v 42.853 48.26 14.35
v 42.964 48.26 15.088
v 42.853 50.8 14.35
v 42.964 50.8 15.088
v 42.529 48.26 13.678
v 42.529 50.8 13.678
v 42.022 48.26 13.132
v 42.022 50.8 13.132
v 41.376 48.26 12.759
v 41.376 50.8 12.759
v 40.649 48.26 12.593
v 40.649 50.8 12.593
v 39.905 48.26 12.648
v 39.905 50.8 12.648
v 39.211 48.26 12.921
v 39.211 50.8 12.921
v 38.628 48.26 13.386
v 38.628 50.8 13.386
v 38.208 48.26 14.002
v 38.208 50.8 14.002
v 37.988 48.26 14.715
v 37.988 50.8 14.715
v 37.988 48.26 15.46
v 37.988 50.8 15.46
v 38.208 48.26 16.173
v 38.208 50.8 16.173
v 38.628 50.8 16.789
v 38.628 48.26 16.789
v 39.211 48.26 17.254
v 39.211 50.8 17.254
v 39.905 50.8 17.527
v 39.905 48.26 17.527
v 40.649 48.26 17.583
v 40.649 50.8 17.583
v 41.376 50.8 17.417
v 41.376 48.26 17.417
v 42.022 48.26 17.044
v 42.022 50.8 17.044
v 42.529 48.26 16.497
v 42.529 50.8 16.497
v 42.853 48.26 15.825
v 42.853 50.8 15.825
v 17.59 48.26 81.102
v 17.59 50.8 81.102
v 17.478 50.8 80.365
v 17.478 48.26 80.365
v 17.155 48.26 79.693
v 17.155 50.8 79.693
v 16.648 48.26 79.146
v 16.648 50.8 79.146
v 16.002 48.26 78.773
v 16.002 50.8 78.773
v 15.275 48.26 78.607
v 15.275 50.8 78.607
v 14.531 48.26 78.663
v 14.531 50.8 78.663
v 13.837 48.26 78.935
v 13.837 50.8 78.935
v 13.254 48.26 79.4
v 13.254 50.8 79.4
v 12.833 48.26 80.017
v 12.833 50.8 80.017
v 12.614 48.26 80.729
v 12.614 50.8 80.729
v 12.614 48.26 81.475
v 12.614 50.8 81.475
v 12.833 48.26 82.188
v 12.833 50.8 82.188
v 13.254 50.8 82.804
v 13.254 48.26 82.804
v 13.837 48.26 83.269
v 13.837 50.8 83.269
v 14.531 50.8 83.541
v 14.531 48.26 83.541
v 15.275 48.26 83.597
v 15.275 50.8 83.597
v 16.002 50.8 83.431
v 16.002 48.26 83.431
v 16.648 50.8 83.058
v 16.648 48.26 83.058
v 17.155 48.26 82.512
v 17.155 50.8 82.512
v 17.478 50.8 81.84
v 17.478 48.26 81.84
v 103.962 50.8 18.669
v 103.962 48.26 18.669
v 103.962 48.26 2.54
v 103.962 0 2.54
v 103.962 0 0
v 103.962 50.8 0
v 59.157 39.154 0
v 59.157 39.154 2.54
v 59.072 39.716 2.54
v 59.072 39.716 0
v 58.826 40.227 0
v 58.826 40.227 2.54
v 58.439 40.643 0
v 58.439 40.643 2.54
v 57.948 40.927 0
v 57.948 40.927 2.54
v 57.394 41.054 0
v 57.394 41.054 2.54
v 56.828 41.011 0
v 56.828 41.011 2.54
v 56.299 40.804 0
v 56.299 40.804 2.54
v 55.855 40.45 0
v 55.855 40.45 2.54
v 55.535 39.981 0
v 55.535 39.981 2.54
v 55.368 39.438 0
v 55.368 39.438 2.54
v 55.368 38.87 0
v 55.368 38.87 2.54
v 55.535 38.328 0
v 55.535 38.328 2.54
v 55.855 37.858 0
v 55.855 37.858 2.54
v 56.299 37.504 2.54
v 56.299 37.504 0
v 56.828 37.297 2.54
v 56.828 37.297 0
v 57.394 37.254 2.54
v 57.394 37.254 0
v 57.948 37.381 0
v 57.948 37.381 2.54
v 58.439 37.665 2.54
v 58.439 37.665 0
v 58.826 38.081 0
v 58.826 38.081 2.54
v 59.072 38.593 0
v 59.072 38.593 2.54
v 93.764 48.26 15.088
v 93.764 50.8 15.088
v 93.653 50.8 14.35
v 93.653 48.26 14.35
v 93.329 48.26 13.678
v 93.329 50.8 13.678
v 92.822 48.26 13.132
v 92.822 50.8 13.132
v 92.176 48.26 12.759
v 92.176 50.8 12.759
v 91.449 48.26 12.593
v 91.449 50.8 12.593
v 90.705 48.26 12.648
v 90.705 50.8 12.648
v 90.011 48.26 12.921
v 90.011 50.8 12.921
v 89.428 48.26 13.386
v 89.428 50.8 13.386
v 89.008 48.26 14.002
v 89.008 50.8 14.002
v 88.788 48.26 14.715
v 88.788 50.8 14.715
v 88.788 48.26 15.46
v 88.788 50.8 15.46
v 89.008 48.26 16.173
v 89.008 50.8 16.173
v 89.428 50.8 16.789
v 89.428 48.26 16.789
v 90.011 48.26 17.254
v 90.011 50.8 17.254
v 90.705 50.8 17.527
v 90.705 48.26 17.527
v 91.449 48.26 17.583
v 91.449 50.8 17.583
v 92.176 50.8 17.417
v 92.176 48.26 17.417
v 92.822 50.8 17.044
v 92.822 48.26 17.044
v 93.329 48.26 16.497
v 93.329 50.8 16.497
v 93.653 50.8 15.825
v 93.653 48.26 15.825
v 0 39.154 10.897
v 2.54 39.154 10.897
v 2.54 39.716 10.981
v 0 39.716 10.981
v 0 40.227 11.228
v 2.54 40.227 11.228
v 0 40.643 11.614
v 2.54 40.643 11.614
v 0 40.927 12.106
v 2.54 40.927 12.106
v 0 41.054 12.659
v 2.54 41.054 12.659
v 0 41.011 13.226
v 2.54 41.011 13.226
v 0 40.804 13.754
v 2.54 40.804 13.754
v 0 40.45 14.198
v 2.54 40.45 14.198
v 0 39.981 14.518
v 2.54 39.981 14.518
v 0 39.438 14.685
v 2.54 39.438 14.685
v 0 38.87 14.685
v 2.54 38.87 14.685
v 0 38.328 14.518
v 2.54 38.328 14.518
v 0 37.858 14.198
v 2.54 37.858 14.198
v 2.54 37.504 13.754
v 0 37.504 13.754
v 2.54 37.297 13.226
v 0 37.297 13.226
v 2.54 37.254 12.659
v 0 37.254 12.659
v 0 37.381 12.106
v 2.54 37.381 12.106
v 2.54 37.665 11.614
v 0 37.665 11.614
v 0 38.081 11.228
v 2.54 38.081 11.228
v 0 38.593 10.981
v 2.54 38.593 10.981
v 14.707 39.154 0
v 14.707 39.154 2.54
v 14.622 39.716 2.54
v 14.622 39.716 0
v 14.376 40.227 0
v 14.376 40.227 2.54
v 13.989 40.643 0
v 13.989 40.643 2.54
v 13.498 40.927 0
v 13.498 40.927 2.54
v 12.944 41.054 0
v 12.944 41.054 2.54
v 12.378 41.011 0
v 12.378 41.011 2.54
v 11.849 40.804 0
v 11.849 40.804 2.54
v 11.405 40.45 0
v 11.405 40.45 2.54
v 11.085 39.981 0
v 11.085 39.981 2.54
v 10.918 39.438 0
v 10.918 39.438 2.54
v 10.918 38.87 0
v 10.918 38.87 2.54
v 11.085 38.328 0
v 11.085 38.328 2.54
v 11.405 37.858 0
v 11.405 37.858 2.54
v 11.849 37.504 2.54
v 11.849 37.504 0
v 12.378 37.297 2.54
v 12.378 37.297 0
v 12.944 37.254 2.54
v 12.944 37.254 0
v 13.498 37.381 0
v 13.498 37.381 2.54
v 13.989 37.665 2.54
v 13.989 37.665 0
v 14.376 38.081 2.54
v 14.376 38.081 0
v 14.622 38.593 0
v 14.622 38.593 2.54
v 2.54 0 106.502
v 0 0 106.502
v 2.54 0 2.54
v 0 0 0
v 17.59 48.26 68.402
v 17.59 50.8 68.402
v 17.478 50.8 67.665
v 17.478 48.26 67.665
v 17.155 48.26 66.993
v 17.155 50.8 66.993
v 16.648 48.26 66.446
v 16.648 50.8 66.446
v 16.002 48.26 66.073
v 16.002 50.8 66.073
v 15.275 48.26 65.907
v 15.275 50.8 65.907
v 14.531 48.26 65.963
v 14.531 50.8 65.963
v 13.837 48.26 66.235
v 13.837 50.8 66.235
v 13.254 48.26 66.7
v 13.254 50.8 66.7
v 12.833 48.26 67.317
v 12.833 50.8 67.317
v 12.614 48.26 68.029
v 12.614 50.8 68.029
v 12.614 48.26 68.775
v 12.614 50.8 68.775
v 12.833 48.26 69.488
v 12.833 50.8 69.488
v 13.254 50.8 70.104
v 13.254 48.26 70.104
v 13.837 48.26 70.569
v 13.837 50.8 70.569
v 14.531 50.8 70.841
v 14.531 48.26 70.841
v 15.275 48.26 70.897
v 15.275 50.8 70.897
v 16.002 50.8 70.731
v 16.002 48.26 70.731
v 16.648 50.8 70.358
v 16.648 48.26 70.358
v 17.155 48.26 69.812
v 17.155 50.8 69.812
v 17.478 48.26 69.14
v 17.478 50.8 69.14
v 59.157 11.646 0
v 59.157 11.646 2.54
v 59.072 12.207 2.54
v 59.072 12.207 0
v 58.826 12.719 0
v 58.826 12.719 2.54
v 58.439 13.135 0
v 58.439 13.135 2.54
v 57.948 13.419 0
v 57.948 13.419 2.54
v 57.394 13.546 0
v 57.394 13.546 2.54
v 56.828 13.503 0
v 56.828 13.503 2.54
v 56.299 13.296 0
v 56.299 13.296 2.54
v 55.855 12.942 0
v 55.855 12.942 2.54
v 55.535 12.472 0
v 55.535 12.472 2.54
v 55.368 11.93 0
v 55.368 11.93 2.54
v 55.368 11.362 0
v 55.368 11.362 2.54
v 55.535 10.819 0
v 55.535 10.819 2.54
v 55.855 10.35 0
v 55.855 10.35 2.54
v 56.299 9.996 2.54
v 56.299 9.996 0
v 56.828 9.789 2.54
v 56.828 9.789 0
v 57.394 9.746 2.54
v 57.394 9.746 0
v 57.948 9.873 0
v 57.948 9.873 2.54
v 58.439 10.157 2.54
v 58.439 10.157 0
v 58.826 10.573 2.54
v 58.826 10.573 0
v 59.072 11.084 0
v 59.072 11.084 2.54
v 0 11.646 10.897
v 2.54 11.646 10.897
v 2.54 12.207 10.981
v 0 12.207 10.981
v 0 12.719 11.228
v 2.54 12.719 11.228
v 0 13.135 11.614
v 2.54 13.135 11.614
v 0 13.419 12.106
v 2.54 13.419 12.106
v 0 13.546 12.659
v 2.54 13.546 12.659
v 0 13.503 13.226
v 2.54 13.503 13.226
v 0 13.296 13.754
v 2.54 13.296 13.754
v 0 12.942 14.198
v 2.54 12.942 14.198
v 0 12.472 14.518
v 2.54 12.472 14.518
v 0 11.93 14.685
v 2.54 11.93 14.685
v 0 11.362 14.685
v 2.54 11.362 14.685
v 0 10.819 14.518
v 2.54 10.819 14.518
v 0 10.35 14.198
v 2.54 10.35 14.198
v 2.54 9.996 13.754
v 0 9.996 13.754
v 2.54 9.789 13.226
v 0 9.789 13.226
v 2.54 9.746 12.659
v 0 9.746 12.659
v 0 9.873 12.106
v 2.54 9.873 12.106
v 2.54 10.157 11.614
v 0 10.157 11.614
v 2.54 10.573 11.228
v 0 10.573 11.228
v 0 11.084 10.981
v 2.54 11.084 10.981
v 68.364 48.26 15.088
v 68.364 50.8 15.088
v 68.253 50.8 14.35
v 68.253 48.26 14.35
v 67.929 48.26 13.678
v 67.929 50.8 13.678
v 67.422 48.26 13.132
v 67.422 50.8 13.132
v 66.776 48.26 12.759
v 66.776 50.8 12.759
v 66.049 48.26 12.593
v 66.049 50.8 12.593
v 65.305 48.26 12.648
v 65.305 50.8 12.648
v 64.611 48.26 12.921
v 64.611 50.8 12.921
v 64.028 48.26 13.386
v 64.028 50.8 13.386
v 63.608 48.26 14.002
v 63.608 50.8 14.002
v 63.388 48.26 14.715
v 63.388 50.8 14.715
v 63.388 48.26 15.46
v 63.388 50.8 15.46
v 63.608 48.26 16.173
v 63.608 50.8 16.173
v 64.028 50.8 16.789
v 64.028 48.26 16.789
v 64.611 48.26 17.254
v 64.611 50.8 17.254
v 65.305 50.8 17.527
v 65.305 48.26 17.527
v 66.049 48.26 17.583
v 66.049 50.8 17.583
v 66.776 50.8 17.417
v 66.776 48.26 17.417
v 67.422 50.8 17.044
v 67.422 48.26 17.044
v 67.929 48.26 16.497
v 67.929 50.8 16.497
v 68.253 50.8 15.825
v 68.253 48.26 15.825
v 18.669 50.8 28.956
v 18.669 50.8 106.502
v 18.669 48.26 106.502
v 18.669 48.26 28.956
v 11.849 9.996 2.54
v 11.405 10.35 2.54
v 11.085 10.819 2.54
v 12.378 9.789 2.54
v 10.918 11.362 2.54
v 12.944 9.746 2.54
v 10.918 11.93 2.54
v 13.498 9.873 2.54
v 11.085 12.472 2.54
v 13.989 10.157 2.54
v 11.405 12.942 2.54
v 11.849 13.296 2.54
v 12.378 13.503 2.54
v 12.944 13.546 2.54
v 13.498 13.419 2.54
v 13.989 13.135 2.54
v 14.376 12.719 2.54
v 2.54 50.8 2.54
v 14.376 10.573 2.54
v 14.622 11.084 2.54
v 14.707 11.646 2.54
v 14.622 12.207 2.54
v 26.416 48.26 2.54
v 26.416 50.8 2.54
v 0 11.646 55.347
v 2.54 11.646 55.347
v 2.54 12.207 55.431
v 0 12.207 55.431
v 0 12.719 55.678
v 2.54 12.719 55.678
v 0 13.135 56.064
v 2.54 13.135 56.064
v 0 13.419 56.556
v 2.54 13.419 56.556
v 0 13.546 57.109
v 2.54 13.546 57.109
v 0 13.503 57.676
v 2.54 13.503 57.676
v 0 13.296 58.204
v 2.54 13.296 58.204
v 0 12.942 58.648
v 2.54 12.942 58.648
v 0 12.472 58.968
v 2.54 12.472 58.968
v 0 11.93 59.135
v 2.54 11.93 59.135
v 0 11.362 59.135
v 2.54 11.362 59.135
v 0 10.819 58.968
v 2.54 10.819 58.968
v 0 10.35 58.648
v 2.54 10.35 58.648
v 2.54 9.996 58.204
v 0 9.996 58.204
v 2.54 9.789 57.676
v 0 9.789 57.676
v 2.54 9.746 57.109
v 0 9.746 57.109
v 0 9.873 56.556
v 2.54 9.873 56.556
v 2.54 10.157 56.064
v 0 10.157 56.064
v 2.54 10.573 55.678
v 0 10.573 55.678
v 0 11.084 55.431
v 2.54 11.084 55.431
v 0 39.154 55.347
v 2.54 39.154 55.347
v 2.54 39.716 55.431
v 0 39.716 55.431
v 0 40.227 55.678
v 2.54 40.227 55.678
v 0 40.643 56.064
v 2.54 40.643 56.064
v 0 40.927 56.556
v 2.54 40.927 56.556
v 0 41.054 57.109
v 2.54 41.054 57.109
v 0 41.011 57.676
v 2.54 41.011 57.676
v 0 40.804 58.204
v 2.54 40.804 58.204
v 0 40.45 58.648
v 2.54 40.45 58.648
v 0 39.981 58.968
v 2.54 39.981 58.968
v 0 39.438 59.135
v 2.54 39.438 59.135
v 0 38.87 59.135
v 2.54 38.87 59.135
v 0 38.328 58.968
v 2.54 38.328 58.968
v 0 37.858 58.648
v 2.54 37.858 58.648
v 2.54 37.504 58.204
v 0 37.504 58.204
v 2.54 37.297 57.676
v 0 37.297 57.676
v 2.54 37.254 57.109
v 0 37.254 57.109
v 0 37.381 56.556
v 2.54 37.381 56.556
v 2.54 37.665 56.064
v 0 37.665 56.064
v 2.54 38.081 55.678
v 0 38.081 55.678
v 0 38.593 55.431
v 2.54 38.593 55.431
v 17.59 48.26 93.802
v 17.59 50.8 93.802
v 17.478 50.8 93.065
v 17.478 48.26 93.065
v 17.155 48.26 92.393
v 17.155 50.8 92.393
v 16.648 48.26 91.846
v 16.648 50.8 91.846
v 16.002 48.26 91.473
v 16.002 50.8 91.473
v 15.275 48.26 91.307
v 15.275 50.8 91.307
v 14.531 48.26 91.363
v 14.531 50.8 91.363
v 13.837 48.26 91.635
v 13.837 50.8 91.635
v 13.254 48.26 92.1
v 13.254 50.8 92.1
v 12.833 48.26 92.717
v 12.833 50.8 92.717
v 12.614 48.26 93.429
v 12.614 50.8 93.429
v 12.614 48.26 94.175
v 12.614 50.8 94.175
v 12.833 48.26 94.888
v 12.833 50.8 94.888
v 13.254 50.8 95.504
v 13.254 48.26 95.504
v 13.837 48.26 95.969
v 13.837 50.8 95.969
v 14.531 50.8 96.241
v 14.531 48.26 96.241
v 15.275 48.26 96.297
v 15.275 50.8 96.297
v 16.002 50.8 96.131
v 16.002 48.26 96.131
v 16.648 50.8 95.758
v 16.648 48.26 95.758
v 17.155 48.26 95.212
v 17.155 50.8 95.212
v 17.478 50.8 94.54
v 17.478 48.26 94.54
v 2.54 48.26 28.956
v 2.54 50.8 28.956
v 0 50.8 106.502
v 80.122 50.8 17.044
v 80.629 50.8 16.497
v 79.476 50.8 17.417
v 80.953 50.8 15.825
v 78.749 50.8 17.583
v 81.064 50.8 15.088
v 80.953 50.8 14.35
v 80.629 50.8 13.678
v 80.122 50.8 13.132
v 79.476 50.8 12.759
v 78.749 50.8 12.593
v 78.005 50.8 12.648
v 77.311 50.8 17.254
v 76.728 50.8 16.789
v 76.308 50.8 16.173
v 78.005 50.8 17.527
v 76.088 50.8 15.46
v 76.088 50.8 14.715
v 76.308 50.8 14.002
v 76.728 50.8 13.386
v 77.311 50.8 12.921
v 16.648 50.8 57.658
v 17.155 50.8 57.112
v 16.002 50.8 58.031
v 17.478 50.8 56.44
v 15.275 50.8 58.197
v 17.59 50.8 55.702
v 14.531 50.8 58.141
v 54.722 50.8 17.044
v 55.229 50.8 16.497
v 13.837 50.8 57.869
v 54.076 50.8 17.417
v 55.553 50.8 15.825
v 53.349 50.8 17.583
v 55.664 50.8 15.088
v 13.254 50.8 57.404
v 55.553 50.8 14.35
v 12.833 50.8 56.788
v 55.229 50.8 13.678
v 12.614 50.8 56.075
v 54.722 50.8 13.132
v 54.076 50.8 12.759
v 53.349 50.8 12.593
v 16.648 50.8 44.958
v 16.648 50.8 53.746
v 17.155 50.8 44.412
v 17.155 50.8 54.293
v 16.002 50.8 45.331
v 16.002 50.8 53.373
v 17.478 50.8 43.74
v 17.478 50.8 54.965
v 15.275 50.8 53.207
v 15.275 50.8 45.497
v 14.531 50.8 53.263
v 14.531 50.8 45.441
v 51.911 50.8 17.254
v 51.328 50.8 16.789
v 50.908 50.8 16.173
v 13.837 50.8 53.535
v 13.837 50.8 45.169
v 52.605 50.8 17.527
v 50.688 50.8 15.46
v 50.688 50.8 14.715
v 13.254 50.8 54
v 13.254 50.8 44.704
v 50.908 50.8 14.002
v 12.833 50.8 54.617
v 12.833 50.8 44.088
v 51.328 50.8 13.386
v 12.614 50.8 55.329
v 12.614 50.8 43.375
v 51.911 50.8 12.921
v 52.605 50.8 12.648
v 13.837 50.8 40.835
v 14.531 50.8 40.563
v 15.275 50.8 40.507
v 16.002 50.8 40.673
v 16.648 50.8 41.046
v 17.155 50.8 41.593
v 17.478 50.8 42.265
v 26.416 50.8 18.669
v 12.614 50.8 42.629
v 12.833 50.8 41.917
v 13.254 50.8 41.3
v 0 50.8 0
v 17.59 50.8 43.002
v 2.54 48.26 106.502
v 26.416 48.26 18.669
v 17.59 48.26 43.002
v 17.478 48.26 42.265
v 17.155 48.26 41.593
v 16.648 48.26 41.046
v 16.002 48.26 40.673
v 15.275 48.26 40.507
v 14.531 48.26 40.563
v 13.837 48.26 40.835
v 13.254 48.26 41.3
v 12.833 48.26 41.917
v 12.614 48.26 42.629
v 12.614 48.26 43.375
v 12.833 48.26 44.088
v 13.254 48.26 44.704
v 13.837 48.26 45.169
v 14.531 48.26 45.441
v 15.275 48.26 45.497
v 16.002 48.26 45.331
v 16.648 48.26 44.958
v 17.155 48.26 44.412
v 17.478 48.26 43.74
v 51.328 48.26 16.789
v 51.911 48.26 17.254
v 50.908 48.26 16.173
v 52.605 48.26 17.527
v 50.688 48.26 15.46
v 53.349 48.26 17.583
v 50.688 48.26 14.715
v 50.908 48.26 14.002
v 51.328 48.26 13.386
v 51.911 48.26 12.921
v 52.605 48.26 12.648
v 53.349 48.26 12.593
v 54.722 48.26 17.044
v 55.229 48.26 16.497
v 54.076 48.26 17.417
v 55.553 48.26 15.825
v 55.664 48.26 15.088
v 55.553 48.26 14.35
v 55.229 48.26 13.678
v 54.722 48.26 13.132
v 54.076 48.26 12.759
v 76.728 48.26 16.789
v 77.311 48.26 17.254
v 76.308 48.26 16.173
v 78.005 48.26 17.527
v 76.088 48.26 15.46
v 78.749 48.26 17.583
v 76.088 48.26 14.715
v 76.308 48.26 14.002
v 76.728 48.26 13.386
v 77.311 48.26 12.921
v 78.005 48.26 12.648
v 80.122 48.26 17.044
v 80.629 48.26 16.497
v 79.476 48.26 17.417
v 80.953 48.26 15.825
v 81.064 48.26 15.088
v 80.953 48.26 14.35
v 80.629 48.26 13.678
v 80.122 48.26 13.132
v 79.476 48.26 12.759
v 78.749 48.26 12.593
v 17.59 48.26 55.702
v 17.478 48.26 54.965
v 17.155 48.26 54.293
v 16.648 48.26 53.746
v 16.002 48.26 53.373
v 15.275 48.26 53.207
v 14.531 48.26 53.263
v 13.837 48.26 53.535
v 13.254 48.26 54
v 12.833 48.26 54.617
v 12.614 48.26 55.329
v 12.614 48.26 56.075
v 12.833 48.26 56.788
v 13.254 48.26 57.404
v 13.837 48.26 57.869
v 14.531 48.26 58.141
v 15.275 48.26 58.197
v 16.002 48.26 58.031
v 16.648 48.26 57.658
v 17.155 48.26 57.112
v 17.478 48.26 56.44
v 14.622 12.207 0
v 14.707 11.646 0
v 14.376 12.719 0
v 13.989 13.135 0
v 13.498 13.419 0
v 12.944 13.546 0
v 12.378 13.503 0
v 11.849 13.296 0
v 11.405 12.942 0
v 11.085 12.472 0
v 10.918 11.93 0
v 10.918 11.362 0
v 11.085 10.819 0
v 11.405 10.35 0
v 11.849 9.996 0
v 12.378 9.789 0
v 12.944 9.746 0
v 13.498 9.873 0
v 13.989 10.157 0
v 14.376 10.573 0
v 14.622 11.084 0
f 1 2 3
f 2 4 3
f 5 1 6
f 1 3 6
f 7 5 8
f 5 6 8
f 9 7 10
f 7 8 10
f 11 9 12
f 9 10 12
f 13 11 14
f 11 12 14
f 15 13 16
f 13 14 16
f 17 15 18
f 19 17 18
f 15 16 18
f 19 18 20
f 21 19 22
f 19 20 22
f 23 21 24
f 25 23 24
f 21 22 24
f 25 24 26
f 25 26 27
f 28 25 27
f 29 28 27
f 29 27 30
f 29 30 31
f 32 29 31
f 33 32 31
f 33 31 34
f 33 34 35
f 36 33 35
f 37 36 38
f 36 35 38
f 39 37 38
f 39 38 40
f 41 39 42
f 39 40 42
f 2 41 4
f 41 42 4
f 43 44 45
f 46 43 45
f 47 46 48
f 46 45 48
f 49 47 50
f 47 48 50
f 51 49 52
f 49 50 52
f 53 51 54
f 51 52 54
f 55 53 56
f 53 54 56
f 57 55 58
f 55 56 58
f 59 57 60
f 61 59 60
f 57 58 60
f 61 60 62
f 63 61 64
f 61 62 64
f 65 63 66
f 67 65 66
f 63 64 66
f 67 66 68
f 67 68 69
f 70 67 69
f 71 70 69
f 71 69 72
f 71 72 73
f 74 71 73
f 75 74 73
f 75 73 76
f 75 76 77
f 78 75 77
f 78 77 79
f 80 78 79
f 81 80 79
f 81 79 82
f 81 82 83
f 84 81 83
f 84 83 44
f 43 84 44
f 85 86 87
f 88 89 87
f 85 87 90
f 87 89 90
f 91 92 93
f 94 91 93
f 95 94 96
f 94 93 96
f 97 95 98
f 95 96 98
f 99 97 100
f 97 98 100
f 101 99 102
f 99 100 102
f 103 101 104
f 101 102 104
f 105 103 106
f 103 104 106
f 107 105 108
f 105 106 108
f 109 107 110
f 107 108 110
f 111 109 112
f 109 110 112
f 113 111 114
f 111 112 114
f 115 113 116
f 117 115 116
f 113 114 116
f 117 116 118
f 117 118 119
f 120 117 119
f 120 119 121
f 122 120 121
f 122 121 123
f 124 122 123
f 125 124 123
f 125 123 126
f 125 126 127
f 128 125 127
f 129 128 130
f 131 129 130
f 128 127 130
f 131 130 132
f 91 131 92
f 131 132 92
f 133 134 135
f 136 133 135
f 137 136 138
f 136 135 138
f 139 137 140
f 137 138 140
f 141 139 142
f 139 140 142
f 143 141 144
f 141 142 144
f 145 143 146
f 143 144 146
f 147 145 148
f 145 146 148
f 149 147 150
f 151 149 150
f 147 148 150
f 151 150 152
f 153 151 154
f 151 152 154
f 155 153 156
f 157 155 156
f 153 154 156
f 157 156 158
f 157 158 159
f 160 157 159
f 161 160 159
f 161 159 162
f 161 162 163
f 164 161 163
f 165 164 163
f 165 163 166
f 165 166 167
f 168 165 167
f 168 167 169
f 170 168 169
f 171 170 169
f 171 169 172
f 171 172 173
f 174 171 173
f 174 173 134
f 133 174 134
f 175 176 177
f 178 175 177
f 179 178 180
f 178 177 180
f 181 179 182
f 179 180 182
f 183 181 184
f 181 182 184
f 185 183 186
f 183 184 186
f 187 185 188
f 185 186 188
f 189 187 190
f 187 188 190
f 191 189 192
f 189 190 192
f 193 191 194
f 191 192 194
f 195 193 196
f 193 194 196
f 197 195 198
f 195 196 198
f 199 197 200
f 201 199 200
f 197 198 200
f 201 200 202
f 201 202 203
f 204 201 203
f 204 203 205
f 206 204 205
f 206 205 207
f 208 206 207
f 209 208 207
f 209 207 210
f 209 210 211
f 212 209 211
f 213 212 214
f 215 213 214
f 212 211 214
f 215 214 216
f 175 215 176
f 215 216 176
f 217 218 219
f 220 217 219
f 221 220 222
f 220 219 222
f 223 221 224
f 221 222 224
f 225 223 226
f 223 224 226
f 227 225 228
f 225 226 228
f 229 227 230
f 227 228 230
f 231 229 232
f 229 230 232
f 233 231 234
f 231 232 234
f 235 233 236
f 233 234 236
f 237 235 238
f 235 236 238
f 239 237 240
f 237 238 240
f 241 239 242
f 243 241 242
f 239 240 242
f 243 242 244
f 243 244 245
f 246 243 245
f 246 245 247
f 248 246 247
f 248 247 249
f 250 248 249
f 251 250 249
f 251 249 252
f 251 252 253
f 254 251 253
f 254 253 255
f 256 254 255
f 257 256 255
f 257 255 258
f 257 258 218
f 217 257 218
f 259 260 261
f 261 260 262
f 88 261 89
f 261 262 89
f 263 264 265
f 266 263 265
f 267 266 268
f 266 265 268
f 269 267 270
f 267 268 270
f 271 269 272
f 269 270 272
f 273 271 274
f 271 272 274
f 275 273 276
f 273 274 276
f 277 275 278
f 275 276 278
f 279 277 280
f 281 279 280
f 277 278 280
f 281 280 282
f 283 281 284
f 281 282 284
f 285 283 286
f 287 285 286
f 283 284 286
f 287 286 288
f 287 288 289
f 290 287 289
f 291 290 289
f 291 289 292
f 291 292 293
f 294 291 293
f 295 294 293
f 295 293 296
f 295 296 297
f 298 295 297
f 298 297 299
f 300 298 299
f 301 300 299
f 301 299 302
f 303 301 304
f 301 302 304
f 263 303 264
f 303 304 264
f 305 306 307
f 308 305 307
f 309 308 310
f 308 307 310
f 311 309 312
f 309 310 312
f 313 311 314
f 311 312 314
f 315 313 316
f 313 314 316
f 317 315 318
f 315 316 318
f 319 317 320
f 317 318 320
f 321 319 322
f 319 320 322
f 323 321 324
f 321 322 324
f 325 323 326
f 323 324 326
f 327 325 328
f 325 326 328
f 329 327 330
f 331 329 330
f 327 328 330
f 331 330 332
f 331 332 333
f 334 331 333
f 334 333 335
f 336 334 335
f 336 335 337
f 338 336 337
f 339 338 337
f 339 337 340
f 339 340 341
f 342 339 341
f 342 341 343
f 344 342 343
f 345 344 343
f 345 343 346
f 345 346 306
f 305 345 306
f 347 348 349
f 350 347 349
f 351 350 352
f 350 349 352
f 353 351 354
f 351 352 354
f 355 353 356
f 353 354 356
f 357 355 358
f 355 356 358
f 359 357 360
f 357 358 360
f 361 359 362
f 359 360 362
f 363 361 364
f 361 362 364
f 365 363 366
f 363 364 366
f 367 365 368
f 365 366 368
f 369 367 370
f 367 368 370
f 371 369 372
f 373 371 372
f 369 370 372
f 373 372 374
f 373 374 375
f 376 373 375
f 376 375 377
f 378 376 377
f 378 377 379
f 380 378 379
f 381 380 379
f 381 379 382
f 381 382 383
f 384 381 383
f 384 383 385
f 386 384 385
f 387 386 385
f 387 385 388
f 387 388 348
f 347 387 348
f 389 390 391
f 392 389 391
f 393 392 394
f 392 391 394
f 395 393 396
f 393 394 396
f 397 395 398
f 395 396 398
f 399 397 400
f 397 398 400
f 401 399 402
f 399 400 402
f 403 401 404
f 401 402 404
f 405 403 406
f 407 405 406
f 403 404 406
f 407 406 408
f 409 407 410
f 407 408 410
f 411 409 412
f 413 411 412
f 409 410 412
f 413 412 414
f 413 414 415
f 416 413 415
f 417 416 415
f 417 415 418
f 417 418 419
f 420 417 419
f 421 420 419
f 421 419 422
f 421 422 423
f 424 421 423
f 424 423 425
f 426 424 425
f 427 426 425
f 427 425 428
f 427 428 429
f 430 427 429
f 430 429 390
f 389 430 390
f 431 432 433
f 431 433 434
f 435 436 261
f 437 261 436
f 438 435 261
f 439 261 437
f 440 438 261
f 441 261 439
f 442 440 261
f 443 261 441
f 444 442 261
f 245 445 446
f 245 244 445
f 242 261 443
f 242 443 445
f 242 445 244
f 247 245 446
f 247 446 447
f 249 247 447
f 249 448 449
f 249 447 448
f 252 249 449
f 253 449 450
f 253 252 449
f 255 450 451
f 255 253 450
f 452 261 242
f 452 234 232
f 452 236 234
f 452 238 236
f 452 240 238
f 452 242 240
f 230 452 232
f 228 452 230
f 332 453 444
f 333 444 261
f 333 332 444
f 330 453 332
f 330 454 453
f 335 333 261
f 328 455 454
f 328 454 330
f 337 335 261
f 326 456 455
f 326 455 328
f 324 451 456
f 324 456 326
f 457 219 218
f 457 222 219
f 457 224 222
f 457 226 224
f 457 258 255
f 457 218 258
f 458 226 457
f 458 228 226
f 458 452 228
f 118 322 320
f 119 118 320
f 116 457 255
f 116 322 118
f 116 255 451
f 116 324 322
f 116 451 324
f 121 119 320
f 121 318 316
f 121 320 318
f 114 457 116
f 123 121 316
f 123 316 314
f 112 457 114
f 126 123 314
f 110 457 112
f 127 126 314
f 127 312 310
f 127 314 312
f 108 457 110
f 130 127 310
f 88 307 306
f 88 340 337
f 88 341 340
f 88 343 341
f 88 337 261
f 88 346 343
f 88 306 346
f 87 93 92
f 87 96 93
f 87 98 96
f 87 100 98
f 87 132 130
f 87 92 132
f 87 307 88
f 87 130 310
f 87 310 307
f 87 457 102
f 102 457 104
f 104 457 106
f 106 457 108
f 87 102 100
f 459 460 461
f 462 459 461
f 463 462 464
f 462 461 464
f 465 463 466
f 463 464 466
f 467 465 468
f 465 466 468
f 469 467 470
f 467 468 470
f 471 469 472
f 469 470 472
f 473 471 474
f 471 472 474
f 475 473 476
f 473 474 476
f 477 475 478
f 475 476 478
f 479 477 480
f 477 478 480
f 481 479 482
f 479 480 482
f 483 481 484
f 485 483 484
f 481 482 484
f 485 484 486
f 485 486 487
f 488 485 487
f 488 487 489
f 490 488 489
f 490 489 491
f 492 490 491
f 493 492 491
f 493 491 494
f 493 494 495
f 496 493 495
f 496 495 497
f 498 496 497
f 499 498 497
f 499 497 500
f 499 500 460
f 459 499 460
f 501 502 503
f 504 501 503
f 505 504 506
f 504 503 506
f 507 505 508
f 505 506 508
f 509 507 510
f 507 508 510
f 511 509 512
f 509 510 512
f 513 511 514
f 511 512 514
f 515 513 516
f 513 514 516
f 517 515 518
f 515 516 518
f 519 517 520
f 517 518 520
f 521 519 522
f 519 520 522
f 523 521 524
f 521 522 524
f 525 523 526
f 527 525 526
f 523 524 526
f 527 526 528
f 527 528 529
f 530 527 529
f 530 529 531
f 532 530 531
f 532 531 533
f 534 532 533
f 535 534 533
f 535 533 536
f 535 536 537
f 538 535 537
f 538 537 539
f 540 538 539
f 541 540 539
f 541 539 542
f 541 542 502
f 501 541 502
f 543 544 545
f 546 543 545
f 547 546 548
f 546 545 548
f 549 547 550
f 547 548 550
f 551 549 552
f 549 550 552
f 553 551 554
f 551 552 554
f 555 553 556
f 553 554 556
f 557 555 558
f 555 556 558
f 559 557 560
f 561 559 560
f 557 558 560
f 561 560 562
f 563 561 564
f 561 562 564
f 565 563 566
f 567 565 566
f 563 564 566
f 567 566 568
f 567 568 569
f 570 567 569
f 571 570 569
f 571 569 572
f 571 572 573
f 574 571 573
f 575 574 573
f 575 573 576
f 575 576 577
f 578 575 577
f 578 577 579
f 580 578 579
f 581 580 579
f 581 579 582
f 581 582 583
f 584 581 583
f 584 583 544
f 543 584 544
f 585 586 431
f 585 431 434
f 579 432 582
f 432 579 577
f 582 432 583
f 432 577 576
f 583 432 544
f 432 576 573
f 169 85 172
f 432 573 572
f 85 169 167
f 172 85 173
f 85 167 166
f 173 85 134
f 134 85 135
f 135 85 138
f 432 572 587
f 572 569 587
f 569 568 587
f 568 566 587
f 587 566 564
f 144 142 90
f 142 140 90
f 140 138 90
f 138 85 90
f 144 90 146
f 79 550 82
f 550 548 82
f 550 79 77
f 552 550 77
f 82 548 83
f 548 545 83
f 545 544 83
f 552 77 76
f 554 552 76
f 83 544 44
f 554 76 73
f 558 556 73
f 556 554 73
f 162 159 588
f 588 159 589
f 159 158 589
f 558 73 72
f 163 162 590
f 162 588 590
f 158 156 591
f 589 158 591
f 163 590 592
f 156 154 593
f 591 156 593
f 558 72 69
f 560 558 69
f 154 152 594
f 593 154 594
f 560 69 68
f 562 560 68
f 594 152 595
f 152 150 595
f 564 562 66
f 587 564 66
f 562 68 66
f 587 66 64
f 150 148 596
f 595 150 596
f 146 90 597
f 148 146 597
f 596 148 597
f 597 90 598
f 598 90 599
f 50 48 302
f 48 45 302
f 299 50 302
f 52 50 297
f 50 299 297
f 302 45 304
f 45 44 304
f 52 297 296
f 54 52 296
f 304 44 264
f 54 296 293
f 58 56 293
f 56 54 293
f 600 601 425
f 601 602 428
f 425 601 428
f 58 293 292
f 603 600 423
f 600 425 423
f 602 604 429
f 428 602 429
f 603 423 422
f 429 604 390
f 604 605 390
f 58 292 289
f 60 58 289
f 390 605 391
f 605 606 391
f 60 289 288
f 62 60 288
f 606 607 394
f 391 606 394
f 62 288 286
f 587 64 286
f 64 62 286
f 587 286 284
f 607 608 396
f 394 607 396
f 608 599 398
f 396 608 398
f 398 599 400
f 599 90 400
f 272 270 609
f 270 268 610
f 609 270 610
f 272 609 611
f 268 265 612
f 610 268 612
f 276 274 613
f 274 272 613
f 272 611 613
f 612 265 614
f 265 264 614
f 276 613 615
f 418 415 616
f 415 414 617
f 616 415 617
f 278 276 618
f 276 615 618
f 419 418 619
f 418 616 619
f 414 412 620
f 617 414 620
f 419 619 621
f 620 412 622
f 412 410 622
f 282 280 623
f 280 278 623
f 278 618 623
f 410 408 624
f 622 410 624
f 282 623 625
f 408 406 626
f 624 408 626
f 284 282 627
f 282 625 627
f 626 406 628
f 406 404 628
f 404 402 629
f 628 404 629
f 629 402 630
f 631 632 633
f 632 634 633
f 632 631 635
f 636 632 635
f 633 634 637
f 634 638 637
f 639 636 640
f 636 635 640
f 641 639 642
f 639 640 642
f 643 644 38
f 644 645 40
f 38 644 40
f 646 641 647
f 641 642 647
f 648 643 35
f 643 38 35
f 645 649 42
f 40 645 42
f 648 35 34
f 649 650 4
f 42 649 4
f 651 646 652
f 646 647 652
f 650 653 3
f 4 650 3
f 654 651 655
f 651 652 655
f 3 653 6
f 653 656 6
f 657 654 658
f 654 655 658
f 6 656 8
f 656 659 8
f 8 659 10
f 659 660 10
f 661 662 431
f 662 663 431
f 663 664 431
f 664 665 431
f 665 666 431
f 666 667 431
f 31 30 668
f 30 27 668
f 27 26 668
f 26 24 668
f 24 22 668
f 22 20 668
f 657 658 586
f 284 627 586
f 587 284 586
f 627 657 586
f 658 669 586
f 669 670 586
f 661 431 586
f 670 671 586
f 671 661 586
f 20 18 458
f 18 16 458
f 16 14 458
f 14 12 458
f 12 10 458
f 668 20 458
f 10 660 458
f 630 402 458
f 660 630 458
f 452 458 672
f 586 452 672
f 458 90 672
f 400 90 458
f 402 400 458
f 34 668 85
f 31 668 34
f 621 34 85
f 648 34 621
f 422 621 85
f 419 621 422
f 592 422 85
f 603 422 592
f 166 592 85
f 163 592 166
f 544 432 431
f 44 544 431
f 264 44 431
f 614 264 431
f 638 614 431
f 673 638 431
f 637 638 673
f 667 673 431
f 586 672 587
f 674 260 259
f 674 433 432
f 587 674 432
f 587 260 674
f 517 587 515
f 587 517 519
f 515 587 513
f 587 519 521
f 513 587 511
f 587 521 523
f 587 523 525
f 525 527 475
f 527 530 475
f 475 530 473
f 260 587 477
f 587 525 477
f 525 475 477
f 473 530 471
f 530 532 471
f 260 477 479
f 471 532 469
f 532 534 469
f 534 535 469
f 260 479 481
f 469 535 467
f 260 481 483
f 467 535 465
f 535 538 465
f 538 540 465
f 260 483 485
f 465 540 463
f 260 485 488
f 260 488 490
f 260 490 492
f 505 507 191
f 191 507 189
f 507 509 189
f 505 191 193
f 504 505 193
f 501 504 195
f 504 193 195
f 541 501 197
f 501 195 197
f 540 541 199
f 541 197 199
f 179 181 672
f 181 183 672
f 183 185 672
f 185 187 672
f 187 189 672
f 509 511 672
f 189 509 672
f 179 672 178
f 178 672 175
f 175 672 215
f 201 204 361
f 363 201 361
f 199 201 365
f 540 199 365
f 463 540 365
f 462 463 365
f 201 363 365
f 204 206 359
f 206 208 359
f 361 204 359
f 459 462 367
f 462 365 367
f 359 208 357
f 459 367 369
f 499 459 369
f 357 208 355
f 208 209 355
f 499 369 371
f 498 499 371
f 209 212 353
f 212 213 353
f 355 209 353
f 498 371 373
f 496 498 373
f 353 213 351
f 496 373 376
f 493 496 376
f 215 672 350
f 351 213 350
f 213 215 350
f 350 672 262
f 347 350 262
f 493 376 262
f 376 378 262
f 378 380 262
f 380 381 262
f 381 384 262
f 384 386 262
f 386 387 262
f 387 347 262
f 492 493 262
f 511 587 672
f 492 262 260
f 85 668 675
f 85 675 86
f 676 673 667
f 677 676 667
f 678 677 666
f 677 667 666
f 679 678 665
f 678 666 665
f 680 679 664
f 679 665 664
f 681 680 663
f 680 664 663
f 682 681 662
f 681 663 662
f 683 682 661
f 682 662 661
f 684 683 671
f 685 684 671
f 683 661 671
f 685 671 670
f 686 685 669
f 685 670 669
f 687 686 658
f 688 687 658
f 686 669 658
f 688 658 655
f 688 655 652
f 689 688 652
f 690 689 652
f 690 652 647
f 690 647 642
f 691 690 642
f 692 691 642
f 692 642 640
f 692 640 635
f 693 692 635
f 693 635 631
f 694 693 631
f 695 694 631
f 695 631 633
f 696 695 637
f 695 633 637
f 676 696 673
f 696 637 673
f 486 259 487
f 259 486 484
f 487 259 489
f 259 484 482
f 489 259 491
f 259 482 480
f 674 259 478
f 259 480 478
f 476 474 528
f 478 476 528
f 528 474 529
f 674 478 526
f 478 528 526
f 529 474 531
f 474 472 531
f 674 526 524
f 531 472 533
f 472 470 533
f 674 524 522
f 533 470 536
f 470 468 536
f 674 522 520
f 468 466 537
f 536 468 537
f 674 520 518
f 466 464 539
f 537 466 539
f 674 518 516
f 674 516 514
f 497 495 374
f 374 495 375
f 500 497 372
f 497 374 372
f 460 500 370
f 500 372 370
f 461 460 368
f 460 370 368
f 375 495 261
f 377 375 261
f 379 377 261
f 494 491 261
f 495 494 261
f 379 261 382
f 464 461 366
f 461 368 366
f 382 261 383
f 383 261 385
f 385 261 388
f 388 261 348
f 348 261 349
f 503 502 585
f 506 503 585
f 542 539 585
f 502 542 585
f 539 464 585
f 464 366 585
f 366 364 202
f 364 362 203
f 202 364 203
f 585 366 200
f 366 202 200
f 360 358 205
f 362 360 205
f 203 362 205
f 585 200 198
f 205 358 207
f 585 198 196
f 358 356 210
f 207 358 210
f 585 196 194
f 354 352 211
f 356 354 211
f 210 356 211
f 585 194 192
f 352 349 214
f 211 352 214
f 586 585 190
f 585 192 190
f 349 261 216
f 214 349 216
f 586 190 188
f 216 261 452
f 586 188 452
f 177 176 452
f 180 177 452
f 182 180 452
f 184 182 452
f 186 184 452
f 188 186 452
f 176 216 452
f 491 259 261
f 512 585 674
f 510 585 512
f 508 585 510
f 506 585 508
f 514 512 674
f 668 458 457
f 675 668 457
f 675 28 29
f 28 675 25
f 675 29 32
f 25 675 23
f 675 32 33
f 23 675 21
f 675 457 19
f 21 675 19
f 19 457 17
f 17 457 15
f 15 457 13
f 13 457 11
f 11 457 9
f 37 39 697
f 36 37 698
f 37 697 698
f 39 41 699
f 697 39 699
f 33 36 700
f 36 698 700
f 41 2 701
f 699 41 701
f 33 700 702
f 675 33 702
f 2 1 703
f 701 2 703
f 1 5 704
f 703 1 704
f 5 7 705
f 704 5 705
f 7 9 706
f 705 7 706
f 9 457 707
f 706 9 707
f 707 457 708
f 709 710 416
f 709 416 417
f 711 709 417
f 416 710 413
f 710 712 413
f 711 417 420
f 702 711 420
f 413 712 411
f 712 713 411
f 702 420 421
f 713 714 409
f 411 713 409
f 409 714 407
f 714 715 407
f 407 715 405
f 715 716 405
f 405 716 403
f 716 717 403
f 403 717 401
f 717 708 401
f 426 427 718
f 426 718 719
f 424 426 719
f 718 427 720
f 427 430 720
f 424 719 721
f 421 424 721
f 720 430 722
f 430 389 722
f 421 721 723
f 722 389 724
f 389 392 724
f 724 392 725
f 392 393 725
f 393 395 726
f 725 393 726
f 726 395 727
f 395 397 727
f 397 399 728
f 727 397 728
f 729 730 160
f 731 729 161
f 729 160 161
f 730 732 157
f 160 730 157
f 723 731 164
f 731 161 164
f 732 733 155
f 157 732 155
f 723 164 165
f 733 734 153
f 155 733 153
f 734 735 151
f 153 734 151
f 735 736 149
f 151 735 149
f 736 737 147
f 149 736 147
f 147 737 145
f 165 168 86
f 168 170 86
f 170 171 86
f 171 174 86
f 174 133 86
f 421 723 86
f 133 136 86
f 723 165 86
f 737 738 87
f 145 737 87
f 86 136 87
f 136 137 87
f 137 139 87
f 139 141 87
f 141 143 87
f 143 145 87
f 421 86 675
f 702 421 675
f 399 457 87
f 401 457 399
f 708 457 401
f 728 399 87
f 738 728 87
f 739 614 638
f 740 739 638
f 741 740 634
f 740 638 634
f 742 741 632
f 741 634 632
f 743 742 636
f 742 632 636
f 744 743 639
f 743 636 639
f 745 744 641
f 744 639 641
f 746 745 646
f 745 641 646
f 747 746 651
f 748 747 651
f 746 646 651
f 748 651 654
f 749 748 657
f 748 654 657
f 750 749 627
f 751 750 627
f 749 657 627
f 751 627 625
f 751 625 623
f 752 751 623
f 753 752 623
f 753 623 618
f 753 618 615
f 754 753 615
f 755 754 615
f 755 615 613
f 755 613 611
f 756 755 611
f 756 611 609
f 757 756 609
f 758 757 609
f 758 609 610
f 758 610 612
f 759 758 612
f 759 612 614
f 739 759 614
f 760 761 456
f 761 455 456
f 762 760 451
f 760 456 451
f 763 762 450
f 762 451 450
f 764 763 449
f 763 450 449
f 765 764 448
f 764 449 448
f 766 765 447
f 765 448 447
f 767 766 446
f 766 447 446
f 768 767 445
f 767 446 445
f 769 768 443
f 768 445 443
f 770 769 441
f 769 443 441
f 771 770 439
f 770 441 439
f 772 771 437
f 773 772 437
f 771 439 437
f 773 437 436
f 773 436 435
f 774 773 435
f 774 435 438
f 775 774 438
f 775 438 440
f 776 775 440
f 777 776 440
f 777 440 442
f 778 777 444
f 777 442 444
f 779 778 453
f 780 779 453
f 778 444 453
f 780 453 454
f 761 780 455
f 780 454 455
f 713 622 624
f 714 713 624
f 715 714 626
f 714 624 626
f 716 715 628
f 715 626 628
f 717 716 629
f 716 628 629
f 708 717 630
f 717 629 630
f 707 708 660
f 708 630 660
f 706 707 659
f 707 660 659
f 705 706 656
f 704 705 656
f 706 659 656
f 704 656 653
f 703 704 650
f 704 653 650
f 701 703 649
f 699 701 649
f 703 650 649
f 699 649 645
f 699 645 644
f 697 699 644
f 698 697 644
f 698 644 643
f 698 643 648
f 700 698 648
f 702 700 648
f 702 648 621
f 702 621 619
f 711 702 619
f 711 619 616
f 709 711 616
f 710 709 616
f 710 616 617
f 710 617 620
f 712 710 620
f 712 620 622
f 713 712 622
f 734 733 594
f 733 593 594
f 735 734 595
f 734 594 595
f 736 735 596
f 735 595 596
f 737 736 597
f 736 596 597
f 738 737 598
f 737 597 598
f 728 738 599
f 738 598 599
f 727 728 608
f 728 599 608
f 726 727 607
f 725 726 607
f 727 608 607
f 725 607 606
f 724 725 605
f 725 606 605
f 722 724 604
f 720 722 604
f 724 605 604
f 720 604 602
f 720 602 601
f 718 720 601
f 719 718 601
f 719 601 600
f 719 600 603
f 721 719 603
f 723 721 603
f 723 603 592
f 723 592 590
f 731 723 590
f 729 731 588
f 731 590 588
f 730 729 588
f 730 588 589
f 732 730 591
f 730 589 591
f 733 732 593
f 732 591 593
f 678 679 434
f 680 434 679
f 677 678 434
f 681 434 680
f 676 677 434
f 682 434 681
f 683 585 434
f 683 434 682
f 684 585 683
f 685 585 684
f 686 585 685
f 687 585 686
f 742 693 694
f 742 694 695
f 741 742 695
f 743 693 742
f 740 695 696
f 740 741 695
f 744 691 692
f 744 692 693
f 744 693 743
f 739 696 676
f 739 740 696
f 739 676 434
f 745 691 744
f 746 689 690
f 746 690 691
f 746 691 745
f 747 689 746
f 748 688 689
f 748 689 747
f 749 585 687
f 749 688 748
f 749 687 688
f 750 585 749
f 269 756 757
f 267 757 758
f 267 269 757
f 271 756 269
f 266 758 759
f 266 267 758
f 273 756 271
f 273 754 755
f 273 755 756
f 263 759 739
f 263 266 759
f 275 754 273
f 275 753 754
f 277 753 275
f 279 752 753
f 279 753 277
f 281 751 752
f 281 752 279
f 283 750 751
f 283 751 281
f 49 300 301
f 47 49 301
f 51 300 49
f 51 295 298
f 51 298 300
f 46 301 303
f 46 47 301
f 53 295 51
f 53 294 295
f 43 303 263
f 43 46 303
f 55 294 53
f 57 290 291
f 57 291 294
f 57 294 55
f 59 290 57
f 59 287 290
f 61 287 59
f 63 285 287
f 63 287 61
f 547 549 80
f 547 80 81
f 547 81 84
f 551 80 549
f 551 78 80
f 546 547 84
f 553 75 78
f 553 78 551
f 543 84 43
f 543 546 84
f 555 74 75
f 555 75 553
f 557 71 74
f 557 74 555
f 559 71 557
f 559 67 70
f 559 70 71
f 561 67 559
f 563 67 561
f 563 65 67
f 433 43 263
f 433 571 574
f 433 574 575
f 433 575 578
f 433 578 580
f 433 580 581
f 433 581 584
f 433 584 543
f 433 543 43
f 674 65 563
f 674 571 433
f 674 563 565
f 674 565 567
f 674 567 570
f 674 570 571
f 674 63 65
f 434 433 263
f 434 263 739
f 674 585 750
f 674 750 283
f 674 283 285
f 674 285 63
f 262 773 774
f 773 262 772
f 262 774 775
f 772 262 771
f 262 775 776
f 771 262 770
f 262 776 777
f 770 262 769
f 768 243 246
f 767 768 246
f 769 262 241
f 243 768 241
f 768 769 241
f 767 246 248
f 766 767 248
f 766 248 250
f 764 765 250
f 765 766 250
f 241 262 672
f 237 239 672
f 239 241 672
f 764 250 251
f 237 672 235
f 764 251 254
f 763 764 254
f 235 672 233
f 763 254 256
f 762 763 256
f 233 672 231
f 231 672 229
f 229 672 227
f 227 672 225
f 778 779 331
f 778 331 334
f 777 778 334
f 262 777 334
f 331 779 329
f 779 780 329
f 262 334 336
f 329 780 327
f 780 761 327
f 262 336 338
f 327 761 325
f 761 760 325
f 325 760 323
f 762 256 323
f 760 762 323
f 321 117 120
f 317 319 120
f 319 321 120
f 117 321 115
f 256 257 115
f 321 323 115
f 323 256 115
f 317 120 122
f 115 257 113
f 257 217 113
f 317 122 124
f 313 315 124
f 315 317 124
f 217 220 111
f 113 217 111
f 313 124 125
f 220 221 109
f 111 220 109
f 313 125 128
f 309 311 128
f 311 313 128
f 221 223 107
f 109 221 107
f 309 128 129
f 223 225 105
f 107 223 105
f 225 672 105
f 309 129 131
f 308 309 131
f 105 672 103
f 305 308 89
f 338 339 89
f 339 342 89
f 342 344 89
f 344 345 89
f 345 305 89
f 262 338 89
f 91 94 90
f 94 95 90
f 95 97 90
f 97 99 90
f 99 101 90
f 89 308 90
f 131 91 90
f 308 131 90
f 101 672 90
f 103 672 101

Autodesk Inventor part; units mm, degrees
ref_plane "YZ Plane" through (0, 0, 0) normal (1, 0, 0) x (0, 1, 0)
ref_plane "XZ Plane" through (0, 0, 0) normal (0, 1, 0) x (-1, 0, 0)
ref_plane "XY Plane" through (0, 0, 0) normal (0, 0, 1) x (1, 0, 0)
sketch "Sketch1" plane through (0, 0, 0) normal (0, 0, 1) x (1, 0, 0)
  line L0 (0, 0) -> (103.9622, 0)
  line L1 (103.9622, 0) -> (103.9622, 50.8)
  line L2 (103.9622, 50.8) -> (0, 50.8)
  line L3 (0, 50.8) -> (0, 0)
  line L4 (0, 50.8) -> (103.9622, 50.8)
  line L5 (103.9622, 50.8) -> (103.9622, 42.9936)
  line L6 (0, 42.9936) -> (0, 50.8)
  dimension "d4" = 103.9622
  dimension "d5" = 50.8
extrude "Extrusion1" add sketch "Sketch1" along normal blind 2.54
sketch "Sketch6" plane through (0, 0, 2.54) normal (0, 0, 1) x (1, 0, 0)
  line L0 (103.9622, 0) -> (103.9622, 50.8) projected
  line L1 (103.9622, 50.8) -> (0, 50.8) projected
  line L2 (0, 50.8) -> (0, 0) projected
  line L3 (0, 0) -> (103.9622, 0) projected
  line L4 (0, 0) -> (2.54, 0)
  line L5 (2.54, 0) -> (2.54, 50.8)
  line L6 (2.54, 50.8) -> (0, 50.8)
  line L7 (0, 50.8) -> (0, 0)
  dimension "d23" = 2.54
  dimension "d24" = 50.8
extrude "Extrusion5" add sketch "Sketch6" along normal blind 103.9622 contours L3 L2 L1 L5
sketch "Sketch7" plane through (2.54, 0, 2.54) normal (1, 0, 0) x (0, 0, -1)
  line L0 (0, 50.8) -> (0, 0) projected
  line L1 (0, 50.8) -> (-103.9622, 50.8) projected
  line L2 (-103.9622, 0) -> (-103.9622, 50.8) projected
  line L3 (0, 0) -> (-103.9622, 0) projected
  line L4 (2.54, 0) -> (2.54, 50.8) projected
  line L5 (2.54, 50.8) -> (0, 50.8) projected
  line L6 (0, 0) -> (0, 50.8) projected
  line L7 (2.54, 0) -> (0, 0) projected
  line L8 (0, 50.8) -> (0, 0) projected
  line L9 (0, 50.8) -> (-103.9622, 50.8) projected
  line L10 (-103.9622, 0) -> (-103.9622, 50.8) projected
  line L11 (0, 0) -> (-103.9622, 0) projected
  circle A0 centre (-10.2616, 39.1541) radius 1.905
  circle A1 centre (-10.2616, 11.6459) radius 1.905
  circle A2 centre (-54.7116, 39.1541) radius 1.905
  circle A3 centre (-54.7116, 11.6459) radius 1.905
  dimension "d27" = 3.81
  dimension "d28" = 11.6459
  dimension "d29" = 10.2616
  dimension "d30" = 3.81
  dimension "d31" = 11.6459
  dimension "d32" = 3.81
  dimension "d33" = 3.81
  dimension "d34" = 44.45
  dimension "d35" = 44.45
  dimension "d36" = 11.6459
  dimension "d37" = 10.2616
  dimension "d38" = 11.6459
extrude "Extrusion6" cut sketch "Sketch7" against normal through all contours A0 | A1 | A2 | A3
sketch "Sketch8" plane through (0, 0, 2.54) normal (0, 0, 1) x (1, 0, 0)
  circle A0 centre (12.8016, 39.1541) radius 1.905
  circle A1 centre (12.8016, 11.6459) radius 1.905
  circle A2 centre (57.2516, 39.1541) radius 1.905
  circle A3 centre (57.2516, 11.6459) radius 1.905
  line L0 (103.9622, 50.8) -> (2.54, 50.8) projected
  line L1 (2.54, 0) -> (103.9622, 0) projected
  line L2 (2.54, 0) -> (2.54, 50.8) projected
  line L3 (103.9622, 50.8) -> (26.416, 50.8)
  line L4 (26.416, 50.8) -> (26.416, 48.26)
  line L5 (26.416, 48.26) -> (103.9622, 48.26)
  line L6 (103.9622, 48.26) -> (103.9622, 50.8)
  line L7 (2.54, 13.5509) -> (2.54, 9.7409) projected
  line L8 (2.54, 41.0591) -> (2.54, 37.2491) projected
  line L9 (2.54, 13.5509) -> (2.54, 9.7409) projected
  line L10 (2.54, 41.0591) -> (2.54, 37.2491) projected
  line L11 (2.54, 50.8) -> (2.54, 0) projected
  line L12 (2.54, 0) -> (2.54, 50.8) projected
  line L13 (2.54, 13.5509) -> (2.54, 9.7409) projected
  line L14 (2.54, 41.0591) -> (2.54, 37.2491) projected
  line L15 (2.54, 13.5509) -> (2.54, 9.7409) projected
  line L16 (2.54, 41.0591) -> (2.54, 37.2491) projected
  line L17 (2.54, 50.8) -> (2.54, 0) projected
  line L18 (2.54, 0) -> (2.54, 50.8) projected
  point P0 (0, 0)
  dimension "d41" = 3.81
  dimension "d42" = 3.81
  dimension "d43" = 3.81
  dimension "d44" = 3.81
  dimension "d45" = 11.6459
  dimension "d46" = 11.6459
  dimension "d47" = 11.6459
  dimension "d48" = 11.6459
  dimension "d49" = 10.2616
  dimension "d50" = 10.2616
  dimension "d51" = 44.45
  dimension "d52" = 44.45
  dimension "d55" = 77.5462
  dimension "d56" = 2.54
extrude "Extrusion7" cut sketch "Sketch8" against normal through all contours A0 | A1 | A2 | A3
sketch "Sketch9" plane through (2.54, 0, 2.54) normal (1, 0, 0) x (0, 0, -1)
  circle A0 centre (-54.7116, 11.6459) radius 1.905 projected
  circle A1 centre (-54.7116, 39.1541) radius 1.905 projected
  circle A2 centre (-10.2616, 11.6459) radius 1.905 projected
  circle A3 centre (-10.2616, 39.1541) radius 1.905 projected
  line L0 (0, 50.8) -> (0, 0) projected
  line L1 (0, 50.8) -> (-103.9622, 50.8) projected
  line L2 (-103.9622, 0) -> (-103.9622, 50.8) projected
  line L3 (0, 0) -> (-103.9622, 0) projected
  line L4 (-103.9622, 50.8) -> (-26.416, 50.8)
  line L5 (-26.416, 50.8) -> (-26.416, 48.26)
  line L6 (-26.416, 48.26) -> (-103.9622, 48.26)
  line L7 (-103.9622, 48.26) -> (-103.9622, 50.8)
  point P0 (2.54, 0)
  point P1 (-26.416, 50.8)
  dimension "d57" = 77.5462
  dimension "d58" = 2.54
extrude "Extrusion8" add sketch "Sketch9" along normal blind 16.129 contours L5 L6 L2 L1
sketch "Sketch10" plane through (0, 0, 2.54) normal (0, 0, 1) x (1, 0, 0)
  circle A0 centre (12.8016, 11.6459) radius 1.905 projected
  circle A1 centre (57.2516, 39.1541) radius 1.905 projected
  circle A2 centre (57.2516, 11.6459) radius 1.905 projected
  circle A3 centre (12.8016, 39.1541) radius 1.905 projected
  line L0 (2.54, 50.8) -> (2.54, 0) projected
  line L1 (2.54, 0) -> (103.9622, 0) projected
  line L2 (103.9622, 0) -> (103.9622, 50.8) projected
  line L3 (103.9622, 50.8) -> (2.54, 50.8) projected
  line L4 (103.9622, 50.8) -> (26.416, 50.8)
  line L5 (26.416, 50.8) -> (26.416, 48.26)
  line L6 (26.416, 48.26) -> (103.9622, 48.26)
  line L7 (103.9622, 48.26) -> (103.9622, 50.8)
  point P0 (0, 0)
  dimension "d61" = 77.5462
  dimension "d62" = 2.54
extrude "Extrusion9" add sketch "Sketch10" along normal blind 16.129 contours L3 L2 L6 L5
sketch "Sketch11" plane through (0, 50.8, 0) normal (0, 1, 0) x (1, 0, 0)
  line L0 (103.9622, 0) -> (0, 0) projected
  line L1 (0, 0) -> (0, -106.5022) projected
  line L2 (0, -106.5022) -> (18.669, -106.5022) projected
  line L3 (18.669, -28.956) -> (18.669, -106.5022) projected
  line L4 (2.54, -28.956) -> (18.669, -28.956) projected
  line L5 (2.54, -2.54) -> (2.54, -28.956) projected
  line L6 (26.416, -2.54) -> (2.54, -2.54) projected
  line L7 (26.416, -2.54) -> (26.416, -18.669) projected
  line L8 (103.9622, -18.669) -> (26.416, -18.669) projected
  line L9 (103.9622, 0) -> (103.9622, -18.669) projected
  line L10 (15.0876, -28.956) -> (15.0876, -106.5022)
  circle A0 centre (15.0876, -93.8022) radius 2.5019
  circle A1 centre (15.0876, -81.1022) radius 2.5019
  circle A2 centre (15.0876, -68.4022) radius 2.5019
  circle A3 centre (15.0876, -55.7022) radius 2.5019
  circle A4 centre (15.0876, -43.0022) radius 2.5019
  line L11 (26.416, -15.0876) -> (103.9622, -15.0876)
  circle A5 centre (91.2622, -15.0876) radius 2.5019
  circle A6 centre (78.5622, -15.0876) radius 2.5019
  circle A7 centre (65.8622, -15.0876) radius 2.5019
  circle A8 centre (53.1622, -15.0876) radius 2.5019
  circle A9 centre (40.4622, -15.0876) radius 2.5019
  point P0 (0, 0)
  dimension "d65" = 3.5814
  dimension "d66" = 5.0038
  dimension "d67" = 12.7
  dimension "d70" = 12.7
  dimension "d75" = 3.5814
  dimension "d76" = 5.0038
  dimension "d77" = 12.7
  dimension "d80" = 12.7
extrude "Extrusion10" cut sketch "Sketch11" against normal blind 16.129 contours A5 L11 | L11 A5 | A0 L10 | L10 A0 | A6 L11 | L11 A6 | A9 L11 | L11 A9 | A1 L10 | L10 A1 | A7 L11 | L11 A7 | A4 L10 | L10 A4 | A8 L11 | L11 A8 | A2 L10 | L10 A2 | A3 L10 | L10 A3
properties part number "BDVBS_002_Brachet 2" material "Aluminum 6061"
